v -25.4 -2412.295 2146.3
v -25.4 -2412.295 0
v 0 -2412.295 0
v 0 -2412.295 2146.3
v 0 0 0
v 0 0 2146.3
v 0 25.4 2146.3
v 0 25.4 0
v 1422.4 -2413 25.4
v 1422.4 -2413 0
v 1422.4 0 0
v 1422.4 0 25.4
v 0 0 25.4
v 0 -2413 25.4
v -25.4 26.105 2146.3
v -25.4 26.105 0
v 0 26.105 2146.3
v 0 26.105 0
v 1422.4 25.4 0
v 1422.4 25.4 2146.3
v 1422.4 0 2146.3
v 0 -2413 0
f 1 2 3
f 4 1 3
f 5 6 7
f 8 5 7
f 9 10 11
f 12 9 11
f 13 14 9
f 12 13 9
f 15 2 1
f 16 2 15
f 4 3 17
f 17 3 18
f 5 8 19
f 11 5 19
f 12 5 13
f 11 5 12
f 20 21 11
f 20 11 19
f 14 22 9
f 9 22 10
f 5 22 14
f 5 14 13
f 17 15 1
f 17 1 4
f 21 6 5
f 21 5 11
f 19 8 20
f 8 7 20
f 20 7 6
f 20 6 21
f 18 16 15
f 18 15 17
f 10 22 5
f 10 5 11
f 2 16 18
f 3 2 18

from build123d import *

# Parameters (mm, degrees)
F0_W          = 1422.4
F0_H          = 2413
F1_DEPTH      = 25.4
F2_W          = 1422.4
F2_H          = 25.4
F3_DEPTH      = 2120.9
F3_DEPTH_BACK = 25.4
F4_W          = 25.4
F4_H          = 2438.4
F5_DEPTH      = 2146.3


with BuildPart() as f1:
    # F0 (on Top) → F1 (new body)
    with BuildSketch(Plane.XY):
        with Locations((711.2, -1206.5)):
            Rectangle(F0_W, F0_H)
    extrude(amount=F1_DEPTH)


with BuildPart() as f3:
    # F2 (on face) → F3 (new body, two sides)
    with BuildSketch(Plane.XY.offset(25.4)) as f3_sk:
        with Locations((711.2, 12.7)):
            Rectangle(F2_W, F2_H)
    extrude(amount=F3_DEPTH)
    extrude(f3_sk.sketch, amount=-F3_DEPTH_BACK)


with BuildPart() as f5:
    # F4 (on Top) → F5 (new body)
    with BuildSketch(Plane.XY):
        with Locations((-12.7, -1193.095361)):
            Rectangle(F4_W, F4_H)
    extrude(amount=F5_DEPTH)


solid = Compound([f1.part, f3.part, f5.part])
